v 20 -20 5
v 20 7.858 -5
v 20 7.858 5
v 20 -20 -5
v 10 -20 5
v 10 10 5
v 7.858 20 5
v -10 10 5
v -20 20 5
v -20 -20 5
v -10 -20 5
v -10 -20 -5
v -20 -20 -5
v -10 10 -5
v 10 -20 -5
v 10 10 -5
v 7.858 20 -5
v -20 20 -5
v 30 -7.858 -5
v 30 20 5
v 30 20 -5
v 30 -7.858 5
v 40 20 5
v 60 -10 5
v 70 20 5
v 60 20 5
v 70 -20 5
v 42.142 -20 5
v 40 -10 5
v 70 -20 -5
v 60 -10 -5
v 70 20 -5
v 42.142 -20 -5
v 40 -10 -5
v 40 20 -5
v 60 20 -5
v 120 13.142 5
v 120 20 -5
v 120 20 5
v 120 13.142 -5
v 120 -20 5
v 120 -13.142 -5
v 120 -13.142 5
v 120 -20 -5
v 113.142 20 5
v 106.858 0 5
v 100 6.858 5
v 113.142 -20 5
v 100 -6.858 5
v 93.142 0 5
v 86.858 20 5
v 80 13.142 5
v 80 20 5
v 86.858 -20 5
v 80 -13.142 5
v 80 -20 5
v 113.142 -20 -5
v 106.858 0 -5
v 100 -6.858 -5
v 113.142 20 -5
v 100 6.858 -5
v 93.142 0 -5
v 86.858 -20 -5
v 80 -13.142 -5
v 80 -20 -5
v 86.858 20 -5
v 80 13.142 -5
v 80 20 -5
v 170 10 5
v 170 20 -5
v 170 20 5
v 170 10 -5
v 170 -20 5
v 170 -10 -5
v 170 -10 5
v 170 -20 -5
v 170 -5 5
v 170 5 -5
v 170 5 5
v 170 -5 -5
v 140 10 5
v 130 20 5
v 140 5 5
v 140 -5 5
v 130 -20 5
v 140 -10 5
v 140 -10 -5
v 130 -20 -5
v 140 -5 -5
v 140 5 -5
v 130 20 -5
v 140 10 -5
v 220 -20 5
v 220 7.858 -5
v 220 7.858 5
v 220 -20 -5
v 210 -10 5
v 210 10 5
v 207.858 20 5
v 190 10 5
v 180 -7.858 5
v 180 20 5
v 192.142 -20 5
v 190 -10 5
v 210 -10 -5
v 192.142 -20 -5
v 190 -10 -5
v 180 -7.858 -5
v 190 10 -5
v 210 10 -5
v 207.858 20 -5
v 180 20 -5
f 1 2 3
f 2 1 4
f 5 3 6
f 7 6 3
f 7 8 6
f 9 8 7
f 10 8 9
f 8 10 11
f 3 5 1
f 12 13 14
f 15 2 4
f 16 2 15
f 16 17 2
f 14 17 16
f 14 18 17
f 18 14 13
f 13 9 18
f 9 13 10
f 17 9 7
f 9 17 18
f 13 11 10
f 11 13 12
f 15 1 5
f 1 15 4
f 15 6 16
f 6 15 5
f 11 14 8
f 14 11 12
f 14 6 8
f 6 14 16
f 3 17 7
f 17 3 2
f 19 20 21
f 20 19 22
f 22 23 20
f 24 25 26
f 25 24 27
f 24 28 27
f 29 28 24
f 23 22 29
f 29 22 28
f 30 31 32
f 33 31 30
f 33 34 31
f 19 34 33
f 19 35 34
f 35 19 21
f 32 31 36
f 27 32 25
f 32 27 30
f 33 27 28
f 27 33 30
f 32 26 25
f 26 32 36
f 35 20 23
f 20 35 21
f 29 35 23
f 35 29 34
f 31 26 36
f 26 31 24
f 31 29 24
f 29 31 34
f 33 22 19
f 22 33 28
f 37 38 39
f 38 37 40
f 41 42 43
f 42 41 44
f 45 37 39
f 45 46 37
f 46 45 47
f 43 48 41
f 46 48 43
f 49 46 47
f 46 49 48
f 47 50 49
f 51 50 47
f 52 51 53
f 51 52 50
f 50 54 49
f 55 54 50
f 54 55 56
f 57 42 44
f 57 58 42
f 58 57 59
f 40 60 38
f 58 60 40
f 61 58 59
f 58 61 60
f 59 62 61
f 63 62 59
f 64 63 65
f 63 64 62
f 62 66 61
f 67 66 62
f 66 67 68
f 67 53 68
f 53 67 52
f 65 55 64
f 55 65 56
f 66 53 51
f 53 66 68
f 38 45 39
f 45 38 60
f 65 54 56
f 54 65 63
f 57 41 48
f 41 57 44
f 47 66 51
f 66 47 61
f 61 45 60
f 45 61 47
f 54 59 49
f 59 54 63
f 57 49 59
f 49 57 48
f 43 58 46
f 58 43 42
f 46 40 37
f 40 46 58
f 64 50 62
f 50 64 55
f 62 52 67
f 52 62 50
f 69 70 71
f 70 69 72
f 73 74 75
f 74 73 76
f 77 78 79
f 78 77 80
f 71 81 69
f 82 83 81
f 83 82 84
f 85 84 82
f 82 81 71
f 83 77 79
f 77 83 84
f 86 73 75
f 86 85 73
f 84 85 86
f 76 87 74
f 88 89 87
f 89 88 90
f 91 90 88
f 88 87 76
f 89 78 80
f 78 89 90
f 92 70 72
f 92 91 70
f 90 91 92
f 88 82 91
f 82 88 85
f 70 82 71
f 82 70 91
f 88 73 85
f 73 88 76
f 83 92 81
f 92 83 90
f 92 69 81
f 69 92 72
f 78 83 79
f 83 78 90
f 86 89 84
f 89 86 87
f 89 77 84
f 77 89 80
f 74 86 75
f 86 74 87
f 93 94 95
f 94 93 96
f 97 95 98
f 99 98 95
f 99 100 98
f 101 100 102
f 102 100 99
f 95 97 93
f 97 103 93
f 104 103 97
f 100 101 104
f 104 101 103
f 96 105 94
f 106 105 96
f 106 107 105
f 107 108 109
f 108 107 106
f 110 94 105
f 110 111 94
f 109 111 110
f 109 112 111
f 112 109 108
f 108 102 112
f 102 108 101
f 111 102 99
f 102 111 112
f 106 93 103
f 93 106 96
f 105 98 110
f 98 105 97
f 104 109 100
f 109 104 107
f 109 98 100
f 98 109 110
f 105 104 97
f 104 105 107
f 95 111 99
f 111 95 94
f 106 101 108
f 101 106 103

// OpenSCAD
module n(){

    difference(){
        cube([40,40,10], center=true);
        translate([0,-10,0]) cube([20,40,20], center=true);
        translate([21,21,0]) rotate(45) cube([20,20,20], center=true);
    }
}

module u(){
    rotate(180) n();
}

module x(){
    difference(){
        cube([40,40,10], center=true);
        translate([0,21,0]) rotate(45) cube([20,20,20], center=true);
        translate([0,-21,0]) rotate(45) cube([20,20,20], center=true);
        translate([21,0,0]) rotate(45) cube([20,20,20], center=true);
        translate([-21,0,0]) rotate(45) cube([20,20,20], center=true);
    }
}

module e(){
    difference(){
        cube([40,40,10], center=true);
        translate([10,7.5,0]) cube([40,5,20], center=true);
        translate([10,-7.5,0]) cube([40,5,20], center=true);
    }
}

module o(){
    difference(){
        cube([40,40,10], center=true);
        cube([20,20,20], center=true);
        translate([21,21,0]) rotate(45) cube([20,20,20], center=true);
        translate([-21,-21,0]) rotate(45) cube([20,20,20], center=true);

    }   
}

translate([000,0,0]) n();
translate([050,0,0]) u();
translate([100,0,0]) x();
translate([150,0,0]) e();
translate([200,0,0]) o();
